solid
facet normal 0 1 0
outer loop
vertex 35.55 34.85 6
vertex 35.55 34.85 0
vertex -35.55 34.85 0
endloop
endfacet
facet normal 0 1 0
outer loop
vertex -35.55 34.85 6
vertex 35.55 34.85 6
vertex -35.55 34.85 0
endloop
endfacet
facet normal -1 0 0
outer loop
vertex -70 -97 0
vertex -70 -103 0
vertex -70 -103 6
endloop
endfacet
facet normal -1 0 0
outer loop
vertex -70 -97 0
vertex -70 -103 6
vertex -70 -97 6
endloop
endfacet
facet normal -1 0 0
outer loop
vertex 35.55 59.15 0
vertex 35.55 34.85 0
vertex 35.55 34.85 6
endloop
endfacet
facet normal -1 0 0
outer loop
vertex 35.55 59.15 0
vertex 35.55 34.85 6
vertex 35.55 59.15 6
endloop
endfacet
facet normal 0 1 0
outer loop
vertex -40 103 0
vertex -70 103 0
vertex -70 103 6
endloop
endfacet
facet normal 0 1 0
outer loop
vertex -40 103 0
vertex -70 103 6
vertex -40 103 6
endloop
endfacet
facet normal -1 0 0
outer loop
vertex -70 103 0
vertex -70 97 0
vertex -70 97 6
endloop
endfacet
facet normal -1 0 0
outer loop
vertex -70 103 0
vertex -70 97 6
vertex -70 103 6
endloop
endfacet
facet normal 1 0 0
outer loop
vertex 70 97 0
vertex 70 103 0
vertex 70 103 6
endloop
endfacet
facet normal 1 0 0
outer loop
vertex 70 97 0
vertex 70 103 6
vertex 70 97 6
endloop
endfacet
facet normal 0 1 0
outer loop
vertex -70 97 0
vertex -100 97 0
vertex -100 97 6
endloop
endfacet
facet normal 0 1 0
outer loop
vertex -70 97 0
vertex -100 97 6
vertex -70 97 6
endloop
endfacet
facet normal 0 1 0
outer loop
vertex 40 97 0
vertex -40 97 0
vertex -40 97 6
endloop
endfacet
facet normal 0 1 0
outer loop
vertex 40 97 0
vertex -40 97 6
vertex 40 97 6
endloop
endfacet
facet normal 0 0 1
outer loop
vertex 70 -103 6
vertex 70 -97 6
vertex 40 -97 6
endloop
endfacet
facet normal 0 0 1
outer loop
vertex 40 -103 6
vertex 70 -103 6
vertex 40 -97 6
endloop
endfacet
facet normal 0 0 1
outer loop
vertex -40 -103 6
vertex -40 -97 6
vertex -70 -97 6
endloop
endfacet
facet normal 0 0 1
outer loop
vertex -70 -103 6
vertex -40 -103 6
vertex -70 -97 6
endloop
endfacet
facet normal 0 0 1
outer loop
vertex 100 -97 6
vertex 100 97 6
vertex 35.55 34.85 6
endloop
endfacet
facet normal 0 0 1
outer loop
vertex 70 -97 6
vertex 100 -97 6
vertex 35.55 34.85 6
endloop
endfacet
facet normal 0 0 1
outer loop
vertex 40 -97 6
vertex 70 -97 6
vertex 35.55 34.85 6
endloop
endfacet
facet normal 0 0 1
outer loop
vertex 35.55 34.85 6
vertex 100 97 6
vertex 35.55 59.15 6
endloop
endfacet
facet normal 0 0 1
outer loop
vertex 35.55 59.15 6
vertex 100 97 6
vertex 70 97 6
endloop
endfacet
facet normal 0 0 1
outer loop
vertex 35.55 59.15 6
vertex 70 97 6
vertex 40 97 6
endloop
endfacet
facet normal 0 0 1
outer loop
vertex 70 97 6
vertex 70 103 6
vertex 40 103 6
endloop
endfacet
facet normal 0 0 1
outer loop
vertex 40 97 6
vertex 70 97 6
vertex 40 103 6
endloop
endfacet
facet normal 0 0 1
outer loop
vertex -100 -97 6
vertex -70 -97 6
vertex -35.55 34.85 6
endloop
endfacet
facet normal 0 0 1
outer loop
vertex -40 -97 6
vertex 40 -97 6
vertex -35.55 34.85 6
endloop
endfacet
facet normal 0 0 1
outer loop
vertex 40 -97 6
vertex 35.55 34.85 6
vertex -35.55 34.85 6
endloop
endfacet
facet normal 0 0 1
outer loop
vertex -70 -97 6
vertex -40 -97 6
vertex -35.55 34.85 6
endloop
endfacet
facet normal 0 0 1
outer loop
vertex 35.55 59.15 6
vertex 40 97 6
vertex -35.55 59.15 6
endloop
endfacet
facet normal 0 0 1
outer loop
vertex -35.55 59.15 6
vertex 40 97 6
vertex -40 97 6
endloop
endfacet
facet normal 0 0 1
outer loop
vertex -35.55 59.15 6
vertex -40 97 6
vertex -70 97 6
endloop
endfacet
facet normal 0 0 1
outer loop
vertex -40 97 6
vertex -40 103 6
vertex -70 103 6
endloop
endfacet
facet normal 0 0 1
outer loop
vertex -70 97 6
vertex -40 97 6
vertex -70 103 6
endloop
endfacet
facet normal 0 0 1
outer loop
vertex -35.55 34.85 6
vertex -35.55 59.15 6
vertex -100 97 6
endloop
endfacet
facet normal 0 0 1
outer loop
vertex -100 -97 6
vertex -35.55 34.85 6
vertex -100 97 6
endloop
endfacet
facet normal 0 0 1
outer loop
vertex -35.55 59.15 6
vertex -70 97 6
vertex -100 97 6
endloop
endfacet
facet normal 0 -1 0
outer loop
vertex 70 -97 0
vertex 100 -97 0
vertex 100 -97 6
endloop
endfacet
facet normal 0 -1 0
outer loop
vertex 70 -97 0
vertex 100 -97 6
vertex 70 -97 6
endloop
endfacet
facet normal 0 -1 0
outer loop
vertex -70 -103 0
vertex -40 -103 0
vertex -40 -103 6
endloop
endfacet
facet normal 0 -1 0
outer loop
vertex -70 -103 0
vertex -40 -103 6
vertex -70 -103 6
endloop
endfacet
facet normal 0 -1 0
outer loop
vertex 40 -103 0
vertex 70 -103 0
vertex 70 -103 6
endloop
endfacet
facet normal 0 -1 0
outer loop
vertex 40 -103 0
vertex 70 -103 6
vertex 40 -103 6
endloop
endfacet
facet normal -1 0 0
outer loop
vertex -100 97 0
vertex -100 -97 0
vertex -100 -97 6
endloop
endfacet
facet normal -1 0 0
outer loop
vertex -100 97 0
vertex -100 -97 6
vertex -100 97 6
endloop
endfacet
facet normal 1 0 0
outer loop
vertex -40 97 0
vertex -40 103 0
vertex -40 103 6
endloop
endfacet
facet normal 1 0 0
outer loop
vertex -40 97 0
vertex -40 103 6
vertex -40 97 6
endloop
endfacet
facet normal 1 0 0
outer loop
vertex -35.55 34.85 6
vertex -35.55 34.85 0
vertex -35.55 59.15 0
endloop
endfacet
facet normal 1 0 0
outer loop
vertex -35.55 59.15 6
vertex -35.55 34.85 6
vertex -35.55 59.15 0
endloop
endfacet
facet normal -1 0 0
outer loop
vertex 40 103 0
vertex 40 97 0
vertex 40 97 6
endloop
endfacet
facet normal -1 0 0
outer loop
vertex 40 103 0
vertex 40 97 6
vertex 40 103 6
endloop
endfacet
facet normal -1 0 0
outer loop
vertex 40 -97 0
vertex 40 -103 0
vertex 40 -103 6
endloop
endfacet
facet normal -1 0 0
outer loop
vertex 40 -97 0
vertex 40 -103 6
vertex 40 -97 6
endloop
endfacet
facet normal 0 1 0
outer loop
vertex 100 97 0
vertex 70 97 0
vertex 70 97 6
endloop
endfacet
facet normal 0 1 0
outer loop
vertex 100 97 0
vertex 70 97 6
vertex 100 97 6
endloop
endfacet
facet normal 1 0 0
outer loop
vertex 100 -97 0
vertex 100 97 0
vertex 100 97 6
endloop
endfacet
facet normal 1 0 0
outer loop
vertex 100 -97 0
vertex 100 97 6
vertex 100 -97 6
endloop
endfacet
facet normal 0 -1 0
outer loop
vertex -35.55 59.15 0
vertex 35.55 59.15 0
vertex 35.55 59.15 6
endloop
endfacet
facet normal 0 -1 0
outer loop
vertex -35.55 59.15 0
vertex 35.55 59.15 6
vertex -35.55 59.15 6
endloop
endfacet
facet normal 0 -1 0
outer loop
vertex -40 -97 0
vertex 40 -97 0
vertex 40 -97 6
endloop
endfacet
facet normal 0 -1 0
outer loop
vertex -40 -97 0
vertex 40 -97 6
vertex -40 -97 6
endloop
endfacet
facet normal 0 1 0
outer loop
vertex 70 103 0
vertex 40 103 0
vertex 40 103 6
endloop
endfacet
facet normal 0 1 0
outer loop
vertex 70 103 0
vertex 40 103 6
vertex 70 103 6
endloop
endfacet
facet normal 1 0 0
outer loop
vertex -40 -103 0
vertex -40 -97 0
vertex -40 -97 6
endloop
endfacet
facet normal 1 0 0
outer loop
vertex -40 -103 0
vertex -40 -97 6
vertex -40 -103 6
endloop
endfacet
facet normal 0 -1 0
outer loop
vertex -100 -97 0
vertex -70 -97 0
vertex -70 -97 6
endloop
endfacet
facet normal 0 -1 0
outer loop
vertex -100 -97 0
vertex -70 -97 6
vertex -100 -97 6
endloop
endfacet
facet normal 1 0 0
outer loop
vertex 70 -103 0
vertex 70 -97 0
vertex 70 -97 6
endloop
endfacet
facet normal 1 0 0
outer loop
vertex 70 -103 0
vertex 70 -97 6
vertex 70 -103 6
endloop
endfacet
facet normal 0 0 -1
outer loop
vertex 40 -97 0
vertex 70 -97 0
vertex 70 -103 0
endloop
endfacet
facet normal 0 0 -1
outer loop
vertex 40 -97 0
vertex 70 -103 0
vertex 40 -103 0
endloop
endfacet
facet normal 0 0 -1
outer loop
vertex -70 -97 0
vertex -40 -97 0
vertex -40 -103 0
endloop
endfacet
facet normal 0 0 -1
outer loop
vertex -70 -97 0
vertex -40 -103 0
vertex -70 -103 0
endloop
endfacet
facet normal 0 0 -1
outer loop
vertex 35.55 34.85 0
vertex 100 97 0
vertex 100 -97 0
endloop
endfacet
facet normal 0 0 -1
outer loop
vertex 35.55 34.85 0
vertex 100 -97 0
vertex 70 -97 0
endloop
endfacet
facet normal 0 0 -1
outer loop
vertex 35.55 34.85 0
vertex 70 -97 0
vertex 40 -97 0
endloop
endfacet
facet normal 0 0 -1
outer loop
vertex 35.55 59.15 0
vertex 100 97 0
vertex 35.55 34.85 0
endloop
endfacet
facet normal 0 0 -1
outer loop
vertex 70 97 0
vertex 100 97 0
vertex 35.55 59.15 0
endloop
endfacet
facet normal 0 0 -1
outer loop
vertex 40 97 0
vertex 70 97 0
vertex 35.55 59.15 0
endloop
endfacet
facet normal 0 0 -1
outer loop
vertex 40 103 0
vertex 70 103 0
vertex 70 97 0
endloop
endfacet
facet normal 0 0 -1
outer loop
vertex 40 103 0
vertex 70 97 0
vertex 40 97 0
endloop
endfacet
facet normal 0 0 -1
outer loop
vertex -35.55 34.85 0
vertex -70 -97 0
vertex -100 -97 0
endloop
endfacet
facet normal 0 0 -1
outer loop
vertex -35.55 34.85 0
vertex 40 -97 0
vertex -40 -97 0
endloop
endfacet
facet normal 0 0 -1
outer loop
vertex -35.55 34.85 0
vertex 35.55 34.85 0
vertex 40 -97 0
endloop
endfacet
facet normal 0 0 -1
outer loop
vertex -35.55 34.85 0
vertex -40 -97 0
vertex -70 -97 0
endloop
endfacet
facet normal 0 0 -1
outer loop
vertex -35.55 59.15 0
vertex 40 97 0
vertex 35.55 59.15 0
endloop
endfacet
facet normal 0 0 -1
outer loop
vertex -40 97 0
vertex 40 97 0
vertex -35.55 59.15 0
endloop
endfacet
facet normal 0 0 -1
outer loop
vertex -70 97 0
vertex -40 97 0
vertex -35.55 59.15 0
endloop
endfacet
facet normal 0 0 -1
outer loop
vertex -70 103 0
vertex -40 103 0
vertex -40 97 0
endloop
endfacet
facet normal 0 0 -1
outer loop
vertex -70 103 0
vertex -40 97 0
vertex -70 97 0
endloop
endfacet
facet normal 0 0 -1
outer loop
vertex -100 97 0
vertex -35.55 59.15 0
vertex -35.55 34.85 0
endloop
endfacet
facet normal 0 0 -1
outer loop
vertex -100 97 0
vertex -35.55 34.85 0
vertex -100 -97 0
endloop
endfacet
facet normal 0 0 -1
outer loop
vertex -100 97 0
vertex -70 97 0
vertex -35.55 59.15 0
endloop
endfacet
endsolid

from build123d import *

# Parameters (mm, degrees)
RESSALTO_EXTRUS_O1_DEPTH = 6
ESBO_O4_W                = 71.1
ESBO_O4_H                = 24.3
CORTE_EXTRUS_O2_DEPTH    = 6


with BuildPart() as part:
    # Esboço1 → Ressalto-extrusão1 (new body)
    with BuildSketch(Plane.XY):
        Polygon((-70, -97), (-100, -97), (-100, 97), (-70, 97), (-70, 103), (-40, 103), (-40, 97), (40, 97), (40, 103), (70, 103), (70, 97), (100, 97), (100, -97), (70, -97), (70, -103), (40, -103), (40, -97), (-40, -97), (-40, -103), (-70, -103), align=None)
    extrude(amount=RESSALTO_EXTRUS_O1_DEPTH)

    # Esboço4 → Corte-extrusão2 (cut)
    with BuildSketch(Plane(origin=(0, 0, 0), x_dir=(-1, 0, 0), z_dir=(0, 0, -1))):
        with Locations((0, 47)):
            Rectangle(ESBO_O4_W, ESBO_O4_H)
    extrude(amount=-CORTE_EXTRUS_O2_DEPTH, mode=Mode.SUBTRACT)


solid = part.part
